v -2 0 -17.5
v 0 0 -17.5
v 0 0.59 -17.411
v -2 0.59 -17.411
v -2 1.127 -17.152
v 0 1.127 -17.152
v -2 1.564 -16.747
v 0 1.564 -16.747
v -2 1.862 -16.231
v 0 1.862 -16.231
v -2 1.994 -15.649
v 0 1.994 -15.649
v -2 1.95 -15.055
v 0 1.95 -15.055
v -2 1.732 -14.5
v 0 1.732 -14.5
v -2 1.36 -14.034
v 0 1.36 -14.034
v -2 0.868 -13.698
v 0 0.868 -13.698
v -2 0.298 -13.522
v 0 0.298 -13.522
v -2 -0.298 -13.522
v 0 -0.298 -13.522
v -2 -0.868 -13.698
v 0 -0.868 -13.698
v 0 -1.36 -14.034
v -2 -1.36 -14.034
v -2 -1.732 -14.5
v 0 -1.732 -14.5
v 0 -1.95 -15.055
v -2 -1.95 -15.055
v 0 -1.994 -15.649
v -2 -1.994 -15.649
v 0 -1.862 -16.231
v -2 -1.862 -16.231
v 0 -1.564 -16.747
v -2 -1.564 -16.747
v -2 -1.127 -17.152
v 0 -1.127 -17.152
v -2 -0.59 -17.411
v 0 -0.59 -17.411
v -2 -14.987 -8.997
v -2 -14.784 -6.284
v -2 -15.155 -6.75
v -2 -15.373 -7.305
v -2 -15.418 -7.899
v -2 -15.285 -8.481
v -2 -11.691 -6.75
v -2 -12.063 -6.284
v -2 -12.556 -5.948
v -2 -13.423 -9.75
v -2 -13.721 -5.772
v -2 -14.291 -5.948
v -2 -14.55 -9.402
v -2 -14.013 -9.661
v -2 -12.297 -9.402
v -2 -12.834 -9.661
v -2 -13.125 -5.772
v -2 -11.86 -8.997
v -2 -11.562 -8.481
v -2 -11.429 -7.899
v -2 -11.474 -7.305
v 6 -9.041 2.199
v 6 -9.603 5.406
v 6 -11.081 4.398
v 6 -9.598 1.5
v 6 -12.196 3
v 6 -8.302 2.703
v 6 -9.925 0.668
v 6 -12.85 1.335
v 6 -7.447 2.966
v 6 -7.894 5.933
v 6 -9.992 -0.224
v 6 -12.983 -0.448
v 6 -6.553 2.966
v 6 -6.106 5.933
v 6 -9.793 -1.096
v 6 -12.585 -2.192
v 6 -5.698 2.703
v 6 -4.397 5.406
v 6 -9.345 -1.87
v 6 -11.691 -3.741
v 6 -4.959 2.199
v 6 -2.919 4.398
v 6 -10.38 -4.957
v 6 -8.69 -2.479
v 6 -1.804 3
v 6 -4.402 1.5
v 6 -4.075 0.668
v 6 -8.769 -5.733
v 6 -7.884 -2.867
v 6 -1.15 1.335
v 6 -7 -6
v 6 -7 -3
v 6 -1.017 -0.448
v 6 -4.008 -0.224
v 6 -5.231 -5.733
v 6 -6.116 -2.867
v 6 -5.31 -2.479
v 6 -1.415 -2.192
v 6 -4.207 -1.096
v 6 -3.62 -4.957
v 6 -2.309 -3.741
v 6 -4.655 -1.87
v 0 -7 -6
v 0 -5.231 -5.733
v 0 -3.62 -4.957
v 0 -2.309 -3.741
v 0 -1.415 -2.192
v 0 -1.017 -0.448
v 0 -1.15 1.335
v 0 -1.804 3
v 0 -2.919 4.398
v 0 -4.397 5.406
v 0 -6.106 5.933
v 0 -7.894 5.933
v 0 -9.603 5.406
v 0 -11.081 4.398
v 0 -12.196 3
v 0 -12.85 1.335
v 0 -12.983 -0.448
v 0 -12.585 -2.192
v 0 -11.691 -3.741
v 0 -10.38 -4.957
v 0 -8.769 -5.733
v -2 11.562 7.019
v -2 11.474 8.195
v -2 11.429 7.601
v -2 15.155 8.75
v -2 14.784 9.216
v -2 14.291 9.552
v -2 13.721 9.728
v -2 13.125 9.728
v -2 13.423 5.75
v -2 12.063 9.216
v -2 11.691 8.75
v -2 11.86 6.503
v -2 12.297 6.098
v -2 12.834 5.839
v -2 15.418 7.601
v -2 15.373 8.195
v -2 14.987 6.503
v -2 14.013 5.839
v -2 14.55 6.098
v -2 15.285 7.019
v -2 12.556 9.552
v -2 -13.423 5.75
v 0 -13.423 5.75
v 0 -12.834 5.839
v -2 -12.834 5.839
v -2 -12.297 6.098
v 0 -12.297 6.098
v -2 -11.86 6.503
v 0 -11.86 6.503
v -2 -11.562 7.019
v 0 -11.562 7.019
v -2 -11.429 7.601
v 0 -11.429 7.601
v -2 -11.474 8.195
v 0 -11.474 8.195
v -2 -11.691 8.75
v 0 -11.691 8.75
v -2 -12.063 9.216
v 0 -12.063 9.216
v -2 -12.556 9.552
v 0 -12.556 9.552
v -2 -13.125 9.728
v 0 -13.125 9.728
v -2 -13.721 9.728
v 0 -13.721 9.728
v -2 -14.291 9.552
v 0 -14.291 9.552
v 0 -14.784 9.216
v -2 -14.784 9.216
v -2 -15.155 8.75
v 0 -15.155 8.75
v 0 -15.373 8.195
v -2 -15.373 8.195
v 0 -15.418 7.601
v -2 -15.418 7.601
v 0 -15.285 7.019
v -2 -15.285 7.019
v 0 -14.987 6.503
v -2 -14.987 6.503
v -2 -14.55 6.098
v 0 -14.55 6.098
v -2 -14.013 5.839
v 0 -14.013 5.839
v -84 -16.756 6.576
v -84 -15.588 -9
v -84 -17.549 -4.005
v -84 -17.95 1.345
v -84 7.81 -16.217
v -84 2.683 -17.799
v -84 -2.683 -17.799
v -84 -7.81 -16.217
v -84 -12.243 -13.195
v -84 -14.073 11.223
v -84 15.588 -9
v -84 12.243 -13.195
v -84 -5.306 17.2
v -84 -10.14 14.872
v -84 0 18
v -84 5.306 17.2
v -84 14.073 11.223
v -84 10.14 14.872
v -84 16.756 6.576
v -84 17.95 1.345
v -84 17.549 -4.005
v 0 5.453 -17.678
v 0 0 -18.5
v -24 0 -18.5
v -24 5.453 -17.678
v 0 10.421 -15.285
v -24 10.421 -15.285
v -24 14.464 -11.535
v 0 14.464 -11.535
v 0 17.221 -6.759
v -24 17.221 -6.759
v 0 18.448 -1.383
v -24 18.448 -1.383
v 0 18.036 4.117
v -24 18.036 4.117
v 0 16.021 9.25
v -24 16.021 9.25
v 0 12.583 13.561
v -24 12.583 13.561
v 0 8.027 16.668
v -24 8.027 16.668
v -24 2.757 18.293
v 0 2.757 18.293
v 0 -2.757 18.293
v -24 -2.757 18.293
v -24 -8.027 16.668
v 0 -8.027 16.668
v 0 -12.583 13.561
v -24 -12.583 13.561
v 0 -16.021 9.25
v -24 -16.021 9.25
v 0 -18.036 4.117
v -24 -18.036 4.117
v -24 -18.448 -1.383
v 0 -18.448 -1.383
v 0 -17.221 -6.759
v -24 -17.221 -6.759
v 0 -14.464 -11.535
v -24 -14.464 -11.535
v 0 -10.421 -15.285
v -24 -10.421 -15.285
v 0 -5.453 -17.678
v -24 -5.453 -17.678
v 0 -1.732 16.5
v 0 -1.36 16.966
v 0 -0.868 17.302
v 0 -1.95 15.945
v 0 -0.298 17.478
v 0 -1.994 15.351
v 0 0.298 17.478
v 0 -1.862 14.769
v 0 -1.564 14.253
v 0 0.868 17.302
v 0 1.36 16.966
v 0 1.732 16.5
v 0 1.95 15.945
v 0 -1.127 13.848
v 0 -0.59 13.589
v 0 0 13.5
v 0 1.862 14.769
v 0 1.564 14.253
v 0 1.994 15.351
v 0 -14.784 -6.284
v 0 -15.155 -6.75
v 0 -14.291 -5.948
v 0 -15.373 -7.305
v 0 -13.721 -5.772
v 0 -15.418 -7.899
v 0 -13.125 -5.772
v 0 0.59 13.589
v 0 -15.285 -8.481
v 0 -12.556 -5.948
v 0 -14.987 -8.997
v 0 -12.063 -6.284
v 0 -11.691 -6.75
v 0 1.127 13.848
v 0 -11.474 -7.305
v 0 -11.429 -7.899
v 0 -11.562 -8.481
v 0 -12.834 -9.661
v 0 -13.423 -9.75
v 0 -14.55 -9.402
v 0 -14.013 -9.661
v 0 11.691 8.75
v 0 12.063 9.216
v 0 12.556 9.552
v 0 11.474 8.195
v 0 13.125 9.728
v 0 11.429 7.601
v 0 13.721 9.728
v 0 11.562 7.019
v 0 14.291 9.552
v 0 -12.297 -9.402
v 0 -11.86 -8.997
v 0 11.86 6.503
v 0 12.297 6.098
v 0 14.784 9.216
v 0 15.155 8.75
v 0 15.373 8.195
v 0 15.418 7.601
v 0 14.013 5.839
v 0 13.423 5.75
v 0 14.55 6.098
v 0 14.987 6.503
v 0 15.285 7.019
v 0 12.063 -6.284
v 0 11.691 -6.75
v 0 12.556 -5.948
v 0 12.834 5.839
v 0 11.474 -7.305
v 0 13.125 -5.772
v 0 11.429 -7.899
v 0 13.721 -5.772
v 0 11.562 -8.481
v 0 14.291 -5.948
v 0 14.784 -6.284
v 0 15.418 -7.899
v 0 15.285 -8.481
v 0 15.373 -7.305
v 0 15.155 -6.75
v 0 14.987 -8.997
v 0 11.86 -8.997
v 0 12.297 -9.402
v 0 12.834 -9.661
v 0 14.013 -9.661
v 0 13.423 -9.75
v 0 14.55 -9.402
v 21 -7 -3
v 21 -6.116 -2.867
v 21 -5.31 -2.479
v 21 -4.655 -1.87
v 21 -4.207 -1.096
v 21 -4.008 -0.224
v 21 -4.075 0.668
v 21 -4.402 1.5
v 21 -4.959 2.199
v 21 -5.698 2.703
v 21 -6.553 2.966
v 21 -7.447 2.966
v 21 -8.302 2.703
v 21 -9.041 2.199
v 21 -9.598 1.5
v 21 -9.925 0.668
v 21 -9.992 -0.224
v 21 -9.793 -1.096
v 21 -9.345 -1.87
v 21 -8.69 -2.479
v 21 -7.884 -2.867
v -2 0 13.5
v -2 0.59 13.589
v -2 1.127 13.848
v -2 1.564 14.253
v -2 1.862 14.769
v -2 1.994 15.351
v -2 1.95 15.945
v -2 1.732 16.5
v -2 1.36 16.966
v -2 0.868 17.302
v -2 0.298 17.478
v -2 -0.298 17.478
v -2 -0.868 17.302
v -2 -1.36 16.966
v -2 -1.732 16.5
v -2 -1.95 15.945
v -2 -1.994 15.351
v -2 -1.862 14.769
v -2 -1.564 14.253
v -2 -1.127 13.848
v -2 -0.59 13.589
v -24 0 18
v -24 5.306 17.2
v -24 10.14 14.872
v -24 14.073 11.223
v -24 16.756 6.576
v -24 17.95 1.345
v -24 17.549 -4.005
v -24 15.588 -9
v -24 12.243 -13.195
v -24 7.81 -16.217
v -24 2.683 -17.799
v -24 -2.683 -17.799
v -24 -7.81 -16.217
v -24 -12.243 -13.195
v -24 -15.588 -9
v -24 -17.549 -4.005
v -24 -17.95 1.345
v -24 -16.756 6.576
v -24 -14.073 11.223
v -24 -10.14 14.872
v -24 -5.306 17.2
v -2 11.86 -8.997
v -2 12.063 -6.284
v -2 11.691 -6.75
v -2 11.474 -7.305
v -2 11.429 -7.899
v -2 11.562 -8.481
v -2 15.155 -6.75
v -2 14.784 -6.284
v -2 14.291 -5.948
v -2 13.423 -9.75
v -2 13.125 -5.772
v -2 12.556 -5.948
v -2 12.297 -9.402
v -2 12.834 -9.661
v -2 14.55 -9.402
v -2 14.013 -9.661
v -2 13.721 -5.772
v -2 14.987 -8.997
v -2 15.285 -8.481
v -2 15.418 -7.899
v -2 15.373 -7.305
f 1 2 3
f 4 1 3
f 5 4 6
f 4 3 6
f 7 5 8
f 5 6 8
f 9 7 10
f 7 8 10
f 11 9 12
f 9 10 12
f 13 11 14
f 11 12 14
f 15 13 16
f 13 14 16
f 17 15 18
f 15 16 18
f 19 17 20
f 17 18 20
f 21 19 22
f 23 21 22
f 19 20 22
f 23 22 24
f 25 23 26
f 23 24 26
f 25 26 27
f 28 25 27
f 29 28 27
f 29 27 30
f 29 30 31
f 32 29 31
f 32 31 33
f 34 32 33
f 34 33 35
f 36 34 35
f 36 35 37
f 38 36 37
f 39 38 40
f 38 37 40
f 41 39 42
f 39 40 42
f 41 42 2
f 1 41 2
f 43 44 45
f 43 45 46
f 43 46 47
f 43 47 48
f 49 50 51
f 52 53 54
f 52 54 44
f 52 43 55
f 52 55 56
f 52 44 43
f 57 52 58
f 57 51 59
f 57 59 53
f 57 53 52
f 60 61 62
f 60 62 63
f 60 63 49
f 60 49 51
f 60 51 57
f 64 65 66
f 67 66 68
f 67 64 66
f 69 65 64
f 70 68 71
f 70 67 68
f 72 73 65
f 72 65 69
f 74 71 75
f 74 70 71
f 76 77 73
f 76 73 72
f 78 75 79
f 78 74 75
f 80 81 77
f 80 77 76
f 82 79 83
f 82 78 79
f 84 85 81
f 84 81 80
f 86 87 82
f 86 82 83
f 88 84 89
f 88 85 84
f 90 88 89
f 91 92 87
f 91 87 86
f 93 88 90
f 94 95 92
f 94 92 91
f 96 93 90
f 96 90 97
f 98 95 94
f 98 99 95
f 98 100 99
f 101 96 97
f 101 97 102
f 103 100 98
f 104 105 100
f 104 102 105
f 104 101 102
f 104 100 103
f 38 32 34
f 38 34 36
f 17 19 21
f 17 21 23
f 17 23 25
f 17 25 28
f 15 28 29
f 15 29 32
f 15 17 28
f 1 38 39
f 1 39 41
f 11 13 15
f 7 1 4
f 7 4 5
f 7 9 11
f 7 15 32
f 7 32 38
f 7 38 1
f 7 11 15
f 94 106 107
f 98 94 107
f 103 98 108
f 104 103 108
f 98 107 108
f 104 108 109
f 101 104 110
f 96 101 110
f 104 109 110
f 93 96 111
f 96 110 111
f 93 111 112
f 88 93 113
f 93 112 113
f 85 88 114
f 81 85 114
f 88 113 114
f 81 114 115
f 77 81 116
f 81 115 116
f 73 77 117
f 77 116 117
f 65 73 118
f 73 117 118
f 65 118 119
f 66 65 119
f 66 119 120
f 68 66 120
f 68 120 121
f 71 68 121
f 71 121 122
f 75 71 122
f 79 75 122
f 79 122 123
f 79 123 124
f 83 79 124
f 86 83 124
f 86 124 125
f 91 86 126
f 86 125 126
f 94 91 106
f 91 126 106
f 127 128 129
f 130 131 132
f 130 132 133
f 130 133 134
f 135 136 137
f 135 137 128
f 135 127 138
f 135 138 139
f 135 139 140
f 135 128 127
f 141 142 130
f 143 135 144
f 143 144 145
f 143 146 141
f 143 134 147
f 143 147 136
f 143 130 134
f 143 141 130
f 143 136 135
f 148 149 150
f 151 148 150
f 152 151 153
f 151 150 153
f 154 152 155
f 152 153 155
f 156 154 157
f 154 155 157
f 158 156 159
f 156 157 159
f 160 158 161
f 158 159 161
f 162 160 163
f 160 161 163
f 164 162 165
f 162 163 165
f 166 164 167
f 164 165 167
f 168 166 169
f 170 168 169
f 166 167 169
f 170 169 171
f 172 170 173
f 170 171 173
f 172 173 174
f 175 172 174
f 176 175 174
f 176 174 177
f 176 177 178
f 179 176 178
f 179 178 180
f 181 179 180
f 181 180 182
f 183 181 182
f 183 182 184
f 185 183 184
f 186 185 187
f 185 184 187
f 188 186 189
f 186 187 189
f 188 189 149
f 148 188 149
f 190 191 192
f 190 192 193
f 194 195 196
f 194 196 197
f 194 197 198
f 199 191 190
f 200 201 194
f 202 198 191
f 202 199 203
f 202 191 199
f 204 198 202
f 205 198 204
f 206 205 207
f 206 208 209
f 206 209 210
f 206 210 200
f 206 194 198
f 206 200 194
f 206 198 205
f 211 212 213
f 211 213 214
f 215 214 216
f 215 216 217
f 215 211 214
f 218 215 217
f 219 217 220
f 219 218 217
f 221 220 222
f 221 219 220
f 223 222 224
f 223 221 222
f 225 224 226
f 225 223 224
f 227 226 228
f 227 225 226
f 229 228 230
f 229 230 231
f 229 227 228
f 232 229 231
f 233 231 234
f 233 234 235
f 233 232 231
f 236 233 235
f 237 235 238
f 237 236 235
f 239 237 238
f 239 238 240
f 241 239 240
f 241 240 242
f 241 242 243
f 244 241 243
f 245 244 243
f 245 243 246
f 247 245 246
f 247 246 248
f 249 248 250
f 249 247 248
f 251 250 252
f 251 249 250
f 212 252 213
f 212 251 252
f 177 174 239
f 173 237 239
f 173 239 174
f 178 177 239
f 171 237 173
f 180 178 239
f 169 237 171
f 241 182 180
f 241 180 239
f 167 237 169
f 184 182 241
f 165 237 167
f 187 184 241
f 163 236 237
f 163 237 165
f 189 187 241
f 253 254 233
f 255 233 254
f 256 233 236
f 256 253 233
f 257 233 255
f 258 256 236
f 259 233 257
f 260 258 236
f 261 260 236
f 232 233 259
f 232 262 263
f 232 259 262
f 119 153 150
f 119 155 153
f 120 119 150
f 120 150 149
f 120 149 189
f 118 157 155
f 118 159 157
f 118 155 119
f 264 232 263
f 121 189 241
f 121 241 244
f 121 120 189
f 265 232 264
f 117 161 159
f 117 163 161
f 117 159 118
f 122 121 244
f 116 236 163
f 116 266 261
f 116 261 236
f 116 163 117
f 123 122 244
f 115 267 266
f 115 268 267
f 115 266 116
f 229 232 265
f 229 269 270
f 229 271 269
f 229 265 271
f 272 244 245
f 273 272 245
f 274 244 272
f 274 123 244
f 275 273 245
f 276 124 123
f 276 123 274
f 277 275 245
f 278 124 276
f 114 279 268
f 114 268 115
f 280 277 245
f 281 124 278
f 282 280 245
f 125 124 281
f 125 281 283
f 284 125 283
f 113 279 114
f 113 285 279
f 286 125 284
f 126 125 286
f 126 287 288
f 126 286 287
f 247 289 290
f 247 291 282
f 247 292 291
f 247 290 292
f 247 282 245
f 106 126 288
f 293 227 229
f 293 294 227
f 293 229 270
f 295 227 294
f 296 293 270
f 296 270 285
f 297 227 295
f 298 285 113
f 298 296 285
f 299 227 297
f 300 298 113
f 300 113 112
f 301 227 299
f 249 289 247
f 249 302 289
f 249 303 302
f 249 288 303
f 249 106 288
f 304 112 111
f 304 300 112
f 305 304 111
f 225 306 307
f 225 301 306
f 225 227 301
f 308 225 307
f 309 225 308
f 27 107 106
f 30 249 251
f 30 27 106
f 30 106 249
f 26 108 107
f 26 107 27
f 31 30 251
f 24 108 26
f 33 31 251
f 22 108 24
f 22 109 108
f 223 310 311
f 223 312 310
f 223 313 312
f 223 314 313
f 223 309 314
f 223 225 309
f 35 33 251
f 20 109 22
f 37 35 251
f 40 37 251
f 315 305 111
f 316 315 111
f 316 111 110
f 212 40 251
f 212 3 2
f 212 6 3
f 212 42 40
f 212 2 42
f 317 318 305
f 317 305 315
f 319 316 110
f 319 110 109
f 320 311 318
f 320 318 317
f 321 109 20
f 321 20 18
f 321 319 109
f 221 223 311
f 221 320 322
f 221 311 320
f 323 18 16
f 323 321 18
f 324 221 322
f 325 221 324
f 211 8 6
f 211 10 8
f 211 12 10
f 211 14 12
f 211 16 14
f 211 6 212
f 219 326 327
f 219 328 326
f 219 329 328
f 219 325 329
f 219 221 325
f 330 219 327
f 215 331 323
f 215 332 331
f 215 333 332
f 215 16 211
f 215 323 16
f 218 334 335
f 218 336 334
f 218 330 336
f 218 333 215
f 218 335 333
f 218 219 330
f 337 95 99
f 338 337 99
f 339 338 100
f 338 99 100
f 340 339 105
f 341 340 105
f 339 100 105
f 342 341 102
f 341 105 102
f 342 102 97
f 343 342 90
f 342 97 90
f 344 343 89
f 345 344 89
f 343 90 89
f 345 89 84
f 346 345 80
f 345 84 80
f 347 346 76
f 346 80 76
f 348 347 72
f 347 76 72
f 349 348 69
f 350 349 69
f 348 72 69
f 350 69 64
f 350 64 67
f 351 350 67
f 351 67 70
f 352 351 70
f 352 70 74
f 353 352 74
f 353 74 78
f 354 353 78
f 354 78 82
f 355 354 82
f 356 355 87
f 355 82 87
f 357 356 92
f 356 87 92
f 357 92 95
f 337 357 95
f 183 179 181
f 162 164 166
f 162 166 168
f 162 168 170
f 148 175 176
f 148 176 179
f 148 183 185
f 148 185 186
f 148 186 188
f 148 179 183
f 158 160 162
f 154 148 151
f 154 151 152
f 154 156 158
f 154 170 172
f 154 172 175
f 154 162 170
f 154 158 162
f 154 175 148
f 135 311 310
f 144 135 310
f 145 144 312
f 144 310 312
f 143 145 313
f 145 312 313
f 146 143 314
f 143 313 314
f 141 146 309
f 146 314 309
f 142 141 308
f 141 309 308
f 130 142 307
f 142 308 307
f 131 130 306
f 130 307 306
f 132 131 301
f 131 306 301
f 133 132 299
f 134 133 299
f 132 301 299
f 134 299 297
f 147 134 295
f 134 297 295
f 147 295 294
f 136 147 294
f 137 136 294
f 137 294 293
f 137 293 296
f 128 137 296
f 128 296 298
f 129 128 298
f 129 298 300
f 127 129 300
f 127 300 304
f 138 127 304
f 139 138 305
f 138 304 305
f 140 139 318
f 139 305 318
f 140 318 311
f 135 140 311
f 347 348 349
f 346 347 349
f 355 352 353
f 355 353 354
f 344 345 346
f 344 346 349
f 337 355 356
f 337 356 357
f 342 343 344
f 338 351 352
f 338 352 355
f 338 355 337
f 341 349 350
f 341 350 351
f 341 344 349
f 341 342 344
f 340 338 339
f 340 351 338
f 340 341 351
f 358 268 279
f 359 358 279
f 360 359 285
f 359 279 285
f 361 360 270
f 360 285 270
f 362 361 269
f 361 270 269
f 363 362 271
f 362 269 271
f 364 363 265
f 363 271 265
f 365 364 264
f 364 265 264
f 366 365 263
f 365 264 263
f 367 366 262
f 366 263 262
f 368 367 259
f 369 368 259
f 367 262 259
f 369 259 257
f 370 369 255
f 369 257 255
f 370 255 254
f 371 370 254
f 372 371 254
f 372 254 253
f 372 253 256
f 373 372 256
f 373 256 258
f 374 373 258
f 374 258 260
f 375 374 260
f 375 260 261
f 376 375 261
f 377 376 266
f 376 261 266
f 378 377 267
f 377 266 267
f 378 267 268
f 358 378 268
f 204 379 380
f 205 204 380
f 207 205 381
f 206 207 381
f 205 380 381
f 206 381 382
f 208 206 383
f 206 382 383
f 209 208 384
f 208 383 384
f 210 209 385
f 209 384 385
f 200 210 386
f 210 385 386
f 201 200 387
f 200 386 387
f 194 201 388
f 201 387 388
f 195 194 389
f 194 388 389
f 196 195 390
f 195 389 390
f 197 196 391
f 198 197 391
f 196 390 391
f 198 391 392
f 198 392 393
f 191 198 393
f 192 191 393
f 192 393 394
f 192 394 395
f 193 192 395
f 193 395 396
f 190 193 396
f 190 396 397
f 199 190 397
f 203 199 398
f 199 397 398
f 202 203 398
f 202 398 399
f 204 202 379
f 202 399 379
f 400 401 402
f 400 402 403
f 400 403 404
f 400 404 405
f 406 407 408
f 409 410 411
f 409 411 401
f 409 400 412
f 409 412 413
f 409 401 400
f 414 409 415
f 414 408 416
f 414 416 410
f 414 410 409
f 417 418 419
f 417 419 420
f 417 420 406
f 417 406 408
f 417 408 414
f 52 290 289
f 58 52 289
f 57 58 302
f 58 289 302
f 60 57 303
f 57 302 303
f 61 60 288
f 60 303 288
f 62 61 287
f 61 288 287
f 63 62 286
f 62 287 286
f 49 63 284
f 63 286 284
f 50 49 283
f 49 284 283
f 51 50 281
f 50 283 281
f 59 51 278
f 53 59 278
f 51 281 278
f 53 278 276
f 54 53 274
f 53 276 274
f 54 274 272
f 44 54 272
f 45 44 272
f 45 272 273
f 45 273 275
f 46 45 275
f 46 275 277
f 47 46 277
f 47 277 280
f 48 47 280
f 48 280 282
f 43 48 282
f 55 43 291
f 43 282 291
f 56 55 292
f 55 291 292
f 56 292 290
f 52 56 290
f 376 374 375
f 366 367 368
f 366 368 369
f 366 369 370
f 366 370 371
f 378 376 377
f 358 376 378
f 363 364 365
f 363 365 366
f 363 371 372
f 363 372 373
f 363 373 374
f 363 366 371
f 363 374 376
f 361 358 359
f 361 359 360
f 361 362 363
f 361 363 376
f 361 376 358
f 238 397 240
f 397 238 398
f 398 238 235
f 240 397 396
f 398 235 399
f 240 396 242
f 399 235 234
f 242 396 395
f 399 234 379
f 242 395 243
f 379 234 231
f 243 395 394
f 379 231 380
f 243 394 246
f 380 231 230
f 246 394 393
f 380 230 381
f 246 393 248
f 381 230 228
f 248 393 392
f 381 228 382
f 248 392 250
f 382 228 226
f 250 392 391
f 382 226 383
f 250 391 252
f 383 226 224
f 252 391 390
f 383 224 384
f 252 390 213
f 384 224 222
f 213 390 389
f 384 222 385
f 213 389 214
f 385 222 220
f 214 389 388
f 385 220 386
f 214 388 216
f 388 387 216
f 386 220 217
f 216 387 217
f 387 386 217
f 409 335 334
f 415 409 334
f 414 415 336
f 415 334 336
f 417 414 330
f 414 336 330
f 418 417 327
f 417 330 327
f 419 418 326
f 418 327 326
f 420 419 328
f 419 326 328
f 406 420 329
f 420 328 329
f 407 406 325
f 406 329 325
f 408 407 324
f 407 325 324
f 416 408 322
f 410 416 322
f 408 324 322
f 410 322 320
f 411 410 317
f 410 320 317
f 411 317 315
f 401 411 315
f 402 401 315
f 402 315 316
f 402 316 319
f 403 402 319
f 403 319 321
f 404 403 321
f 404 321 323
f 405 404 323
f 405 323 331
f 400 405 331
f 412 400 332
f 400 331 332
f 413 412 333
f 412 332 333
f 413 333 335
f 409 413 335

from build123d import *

# Parameters (mm, degrees)
SKETCH1_R           = 18.5
BOSS_EXTRUDE1_DEPTH = 24
SKETCH2_R           = 18
BOSS_EXTRUDE2_DEPTH = 60
SKETCH3_R           = 6
BOSS_EXTRUDE3_DEPTH = 6
SKETCH4_R           = 3
BOSS_EXTRUDE4_DEPTH = 15
SKETCH5_R           = 2
CUT_EXTRUDE1_DEPTH  = 2


with BuildPart() as part:
    # Sketch1 → Boss-Extrude1 (new body)
    with BuildSketch(Plane(origin=(0, 0, 0), x_dir=(0, 0, -1), z_dir=(1, 0, 0))):
        Circle(SKETCH1_R)
    extrude(amount=-BOSS_EXTRUDE1_DEPTH)

    # Sketch2 → Boss-Extrude2 (add)
    with BuildSketch(Plane.ZY.offset(24)):
        Circle(SKETCH2_R)
    extrude(amount=BOSS_EXTRUDE2_DEPTH)

    # Sketch3 → Boss-Extrude3 (add)
    with BuildSketch(Plane(origin=(0, 0, 0), x_dir=(0, 0, -1), z_dir=(1, 0, 0))):
        with Locations((0, -7)):
            Circle(SKETCH3_R)
    extrude(amount=BOSS_EXTRUDE3_DEPTH)

    # Sketch4 → Boss-Extrude4 (add)
    with BuildSketch(Plane(origin=(6, 0, 0), x_dir=(0, 0, -1), z_dir=(1, 0, 0))):
        with Locations((0, -7)):
            Circle(SKETCH4_R)
    extrude(amount=BOSS_EXTRUDE4_DEPTH)

    # Sketch5 → Cut-Extrude1 (cut)
    with BuildSketch(Plane(origin=(0, 0, 0), x_dir=(0, 0, -1), z_dir=(1, 0, 0))):
        with Locations((-15.5, 0)):
            Circle(SKETCH5_R)
        with Locations((-7.75, 13.423393759)):
            Circle(SKETCH5_R)
        with Locations((7.75, 13.423393759)):
            Circle(SKETCH5_R)
        with Locations((15.5, 0)):
            Circle(SKETCH5_R)
        with Locations((7.75, -13.423393759)):
            Circle(SKETCH5_R)
        with Locations((-7.75, -13.423393759)):
            Circle(SKETCH5_R)
    extrude(amount=-CUT_EXTRUDE1_DEPTH, mode=Mode.SUBTRACT)


solid = part.part
